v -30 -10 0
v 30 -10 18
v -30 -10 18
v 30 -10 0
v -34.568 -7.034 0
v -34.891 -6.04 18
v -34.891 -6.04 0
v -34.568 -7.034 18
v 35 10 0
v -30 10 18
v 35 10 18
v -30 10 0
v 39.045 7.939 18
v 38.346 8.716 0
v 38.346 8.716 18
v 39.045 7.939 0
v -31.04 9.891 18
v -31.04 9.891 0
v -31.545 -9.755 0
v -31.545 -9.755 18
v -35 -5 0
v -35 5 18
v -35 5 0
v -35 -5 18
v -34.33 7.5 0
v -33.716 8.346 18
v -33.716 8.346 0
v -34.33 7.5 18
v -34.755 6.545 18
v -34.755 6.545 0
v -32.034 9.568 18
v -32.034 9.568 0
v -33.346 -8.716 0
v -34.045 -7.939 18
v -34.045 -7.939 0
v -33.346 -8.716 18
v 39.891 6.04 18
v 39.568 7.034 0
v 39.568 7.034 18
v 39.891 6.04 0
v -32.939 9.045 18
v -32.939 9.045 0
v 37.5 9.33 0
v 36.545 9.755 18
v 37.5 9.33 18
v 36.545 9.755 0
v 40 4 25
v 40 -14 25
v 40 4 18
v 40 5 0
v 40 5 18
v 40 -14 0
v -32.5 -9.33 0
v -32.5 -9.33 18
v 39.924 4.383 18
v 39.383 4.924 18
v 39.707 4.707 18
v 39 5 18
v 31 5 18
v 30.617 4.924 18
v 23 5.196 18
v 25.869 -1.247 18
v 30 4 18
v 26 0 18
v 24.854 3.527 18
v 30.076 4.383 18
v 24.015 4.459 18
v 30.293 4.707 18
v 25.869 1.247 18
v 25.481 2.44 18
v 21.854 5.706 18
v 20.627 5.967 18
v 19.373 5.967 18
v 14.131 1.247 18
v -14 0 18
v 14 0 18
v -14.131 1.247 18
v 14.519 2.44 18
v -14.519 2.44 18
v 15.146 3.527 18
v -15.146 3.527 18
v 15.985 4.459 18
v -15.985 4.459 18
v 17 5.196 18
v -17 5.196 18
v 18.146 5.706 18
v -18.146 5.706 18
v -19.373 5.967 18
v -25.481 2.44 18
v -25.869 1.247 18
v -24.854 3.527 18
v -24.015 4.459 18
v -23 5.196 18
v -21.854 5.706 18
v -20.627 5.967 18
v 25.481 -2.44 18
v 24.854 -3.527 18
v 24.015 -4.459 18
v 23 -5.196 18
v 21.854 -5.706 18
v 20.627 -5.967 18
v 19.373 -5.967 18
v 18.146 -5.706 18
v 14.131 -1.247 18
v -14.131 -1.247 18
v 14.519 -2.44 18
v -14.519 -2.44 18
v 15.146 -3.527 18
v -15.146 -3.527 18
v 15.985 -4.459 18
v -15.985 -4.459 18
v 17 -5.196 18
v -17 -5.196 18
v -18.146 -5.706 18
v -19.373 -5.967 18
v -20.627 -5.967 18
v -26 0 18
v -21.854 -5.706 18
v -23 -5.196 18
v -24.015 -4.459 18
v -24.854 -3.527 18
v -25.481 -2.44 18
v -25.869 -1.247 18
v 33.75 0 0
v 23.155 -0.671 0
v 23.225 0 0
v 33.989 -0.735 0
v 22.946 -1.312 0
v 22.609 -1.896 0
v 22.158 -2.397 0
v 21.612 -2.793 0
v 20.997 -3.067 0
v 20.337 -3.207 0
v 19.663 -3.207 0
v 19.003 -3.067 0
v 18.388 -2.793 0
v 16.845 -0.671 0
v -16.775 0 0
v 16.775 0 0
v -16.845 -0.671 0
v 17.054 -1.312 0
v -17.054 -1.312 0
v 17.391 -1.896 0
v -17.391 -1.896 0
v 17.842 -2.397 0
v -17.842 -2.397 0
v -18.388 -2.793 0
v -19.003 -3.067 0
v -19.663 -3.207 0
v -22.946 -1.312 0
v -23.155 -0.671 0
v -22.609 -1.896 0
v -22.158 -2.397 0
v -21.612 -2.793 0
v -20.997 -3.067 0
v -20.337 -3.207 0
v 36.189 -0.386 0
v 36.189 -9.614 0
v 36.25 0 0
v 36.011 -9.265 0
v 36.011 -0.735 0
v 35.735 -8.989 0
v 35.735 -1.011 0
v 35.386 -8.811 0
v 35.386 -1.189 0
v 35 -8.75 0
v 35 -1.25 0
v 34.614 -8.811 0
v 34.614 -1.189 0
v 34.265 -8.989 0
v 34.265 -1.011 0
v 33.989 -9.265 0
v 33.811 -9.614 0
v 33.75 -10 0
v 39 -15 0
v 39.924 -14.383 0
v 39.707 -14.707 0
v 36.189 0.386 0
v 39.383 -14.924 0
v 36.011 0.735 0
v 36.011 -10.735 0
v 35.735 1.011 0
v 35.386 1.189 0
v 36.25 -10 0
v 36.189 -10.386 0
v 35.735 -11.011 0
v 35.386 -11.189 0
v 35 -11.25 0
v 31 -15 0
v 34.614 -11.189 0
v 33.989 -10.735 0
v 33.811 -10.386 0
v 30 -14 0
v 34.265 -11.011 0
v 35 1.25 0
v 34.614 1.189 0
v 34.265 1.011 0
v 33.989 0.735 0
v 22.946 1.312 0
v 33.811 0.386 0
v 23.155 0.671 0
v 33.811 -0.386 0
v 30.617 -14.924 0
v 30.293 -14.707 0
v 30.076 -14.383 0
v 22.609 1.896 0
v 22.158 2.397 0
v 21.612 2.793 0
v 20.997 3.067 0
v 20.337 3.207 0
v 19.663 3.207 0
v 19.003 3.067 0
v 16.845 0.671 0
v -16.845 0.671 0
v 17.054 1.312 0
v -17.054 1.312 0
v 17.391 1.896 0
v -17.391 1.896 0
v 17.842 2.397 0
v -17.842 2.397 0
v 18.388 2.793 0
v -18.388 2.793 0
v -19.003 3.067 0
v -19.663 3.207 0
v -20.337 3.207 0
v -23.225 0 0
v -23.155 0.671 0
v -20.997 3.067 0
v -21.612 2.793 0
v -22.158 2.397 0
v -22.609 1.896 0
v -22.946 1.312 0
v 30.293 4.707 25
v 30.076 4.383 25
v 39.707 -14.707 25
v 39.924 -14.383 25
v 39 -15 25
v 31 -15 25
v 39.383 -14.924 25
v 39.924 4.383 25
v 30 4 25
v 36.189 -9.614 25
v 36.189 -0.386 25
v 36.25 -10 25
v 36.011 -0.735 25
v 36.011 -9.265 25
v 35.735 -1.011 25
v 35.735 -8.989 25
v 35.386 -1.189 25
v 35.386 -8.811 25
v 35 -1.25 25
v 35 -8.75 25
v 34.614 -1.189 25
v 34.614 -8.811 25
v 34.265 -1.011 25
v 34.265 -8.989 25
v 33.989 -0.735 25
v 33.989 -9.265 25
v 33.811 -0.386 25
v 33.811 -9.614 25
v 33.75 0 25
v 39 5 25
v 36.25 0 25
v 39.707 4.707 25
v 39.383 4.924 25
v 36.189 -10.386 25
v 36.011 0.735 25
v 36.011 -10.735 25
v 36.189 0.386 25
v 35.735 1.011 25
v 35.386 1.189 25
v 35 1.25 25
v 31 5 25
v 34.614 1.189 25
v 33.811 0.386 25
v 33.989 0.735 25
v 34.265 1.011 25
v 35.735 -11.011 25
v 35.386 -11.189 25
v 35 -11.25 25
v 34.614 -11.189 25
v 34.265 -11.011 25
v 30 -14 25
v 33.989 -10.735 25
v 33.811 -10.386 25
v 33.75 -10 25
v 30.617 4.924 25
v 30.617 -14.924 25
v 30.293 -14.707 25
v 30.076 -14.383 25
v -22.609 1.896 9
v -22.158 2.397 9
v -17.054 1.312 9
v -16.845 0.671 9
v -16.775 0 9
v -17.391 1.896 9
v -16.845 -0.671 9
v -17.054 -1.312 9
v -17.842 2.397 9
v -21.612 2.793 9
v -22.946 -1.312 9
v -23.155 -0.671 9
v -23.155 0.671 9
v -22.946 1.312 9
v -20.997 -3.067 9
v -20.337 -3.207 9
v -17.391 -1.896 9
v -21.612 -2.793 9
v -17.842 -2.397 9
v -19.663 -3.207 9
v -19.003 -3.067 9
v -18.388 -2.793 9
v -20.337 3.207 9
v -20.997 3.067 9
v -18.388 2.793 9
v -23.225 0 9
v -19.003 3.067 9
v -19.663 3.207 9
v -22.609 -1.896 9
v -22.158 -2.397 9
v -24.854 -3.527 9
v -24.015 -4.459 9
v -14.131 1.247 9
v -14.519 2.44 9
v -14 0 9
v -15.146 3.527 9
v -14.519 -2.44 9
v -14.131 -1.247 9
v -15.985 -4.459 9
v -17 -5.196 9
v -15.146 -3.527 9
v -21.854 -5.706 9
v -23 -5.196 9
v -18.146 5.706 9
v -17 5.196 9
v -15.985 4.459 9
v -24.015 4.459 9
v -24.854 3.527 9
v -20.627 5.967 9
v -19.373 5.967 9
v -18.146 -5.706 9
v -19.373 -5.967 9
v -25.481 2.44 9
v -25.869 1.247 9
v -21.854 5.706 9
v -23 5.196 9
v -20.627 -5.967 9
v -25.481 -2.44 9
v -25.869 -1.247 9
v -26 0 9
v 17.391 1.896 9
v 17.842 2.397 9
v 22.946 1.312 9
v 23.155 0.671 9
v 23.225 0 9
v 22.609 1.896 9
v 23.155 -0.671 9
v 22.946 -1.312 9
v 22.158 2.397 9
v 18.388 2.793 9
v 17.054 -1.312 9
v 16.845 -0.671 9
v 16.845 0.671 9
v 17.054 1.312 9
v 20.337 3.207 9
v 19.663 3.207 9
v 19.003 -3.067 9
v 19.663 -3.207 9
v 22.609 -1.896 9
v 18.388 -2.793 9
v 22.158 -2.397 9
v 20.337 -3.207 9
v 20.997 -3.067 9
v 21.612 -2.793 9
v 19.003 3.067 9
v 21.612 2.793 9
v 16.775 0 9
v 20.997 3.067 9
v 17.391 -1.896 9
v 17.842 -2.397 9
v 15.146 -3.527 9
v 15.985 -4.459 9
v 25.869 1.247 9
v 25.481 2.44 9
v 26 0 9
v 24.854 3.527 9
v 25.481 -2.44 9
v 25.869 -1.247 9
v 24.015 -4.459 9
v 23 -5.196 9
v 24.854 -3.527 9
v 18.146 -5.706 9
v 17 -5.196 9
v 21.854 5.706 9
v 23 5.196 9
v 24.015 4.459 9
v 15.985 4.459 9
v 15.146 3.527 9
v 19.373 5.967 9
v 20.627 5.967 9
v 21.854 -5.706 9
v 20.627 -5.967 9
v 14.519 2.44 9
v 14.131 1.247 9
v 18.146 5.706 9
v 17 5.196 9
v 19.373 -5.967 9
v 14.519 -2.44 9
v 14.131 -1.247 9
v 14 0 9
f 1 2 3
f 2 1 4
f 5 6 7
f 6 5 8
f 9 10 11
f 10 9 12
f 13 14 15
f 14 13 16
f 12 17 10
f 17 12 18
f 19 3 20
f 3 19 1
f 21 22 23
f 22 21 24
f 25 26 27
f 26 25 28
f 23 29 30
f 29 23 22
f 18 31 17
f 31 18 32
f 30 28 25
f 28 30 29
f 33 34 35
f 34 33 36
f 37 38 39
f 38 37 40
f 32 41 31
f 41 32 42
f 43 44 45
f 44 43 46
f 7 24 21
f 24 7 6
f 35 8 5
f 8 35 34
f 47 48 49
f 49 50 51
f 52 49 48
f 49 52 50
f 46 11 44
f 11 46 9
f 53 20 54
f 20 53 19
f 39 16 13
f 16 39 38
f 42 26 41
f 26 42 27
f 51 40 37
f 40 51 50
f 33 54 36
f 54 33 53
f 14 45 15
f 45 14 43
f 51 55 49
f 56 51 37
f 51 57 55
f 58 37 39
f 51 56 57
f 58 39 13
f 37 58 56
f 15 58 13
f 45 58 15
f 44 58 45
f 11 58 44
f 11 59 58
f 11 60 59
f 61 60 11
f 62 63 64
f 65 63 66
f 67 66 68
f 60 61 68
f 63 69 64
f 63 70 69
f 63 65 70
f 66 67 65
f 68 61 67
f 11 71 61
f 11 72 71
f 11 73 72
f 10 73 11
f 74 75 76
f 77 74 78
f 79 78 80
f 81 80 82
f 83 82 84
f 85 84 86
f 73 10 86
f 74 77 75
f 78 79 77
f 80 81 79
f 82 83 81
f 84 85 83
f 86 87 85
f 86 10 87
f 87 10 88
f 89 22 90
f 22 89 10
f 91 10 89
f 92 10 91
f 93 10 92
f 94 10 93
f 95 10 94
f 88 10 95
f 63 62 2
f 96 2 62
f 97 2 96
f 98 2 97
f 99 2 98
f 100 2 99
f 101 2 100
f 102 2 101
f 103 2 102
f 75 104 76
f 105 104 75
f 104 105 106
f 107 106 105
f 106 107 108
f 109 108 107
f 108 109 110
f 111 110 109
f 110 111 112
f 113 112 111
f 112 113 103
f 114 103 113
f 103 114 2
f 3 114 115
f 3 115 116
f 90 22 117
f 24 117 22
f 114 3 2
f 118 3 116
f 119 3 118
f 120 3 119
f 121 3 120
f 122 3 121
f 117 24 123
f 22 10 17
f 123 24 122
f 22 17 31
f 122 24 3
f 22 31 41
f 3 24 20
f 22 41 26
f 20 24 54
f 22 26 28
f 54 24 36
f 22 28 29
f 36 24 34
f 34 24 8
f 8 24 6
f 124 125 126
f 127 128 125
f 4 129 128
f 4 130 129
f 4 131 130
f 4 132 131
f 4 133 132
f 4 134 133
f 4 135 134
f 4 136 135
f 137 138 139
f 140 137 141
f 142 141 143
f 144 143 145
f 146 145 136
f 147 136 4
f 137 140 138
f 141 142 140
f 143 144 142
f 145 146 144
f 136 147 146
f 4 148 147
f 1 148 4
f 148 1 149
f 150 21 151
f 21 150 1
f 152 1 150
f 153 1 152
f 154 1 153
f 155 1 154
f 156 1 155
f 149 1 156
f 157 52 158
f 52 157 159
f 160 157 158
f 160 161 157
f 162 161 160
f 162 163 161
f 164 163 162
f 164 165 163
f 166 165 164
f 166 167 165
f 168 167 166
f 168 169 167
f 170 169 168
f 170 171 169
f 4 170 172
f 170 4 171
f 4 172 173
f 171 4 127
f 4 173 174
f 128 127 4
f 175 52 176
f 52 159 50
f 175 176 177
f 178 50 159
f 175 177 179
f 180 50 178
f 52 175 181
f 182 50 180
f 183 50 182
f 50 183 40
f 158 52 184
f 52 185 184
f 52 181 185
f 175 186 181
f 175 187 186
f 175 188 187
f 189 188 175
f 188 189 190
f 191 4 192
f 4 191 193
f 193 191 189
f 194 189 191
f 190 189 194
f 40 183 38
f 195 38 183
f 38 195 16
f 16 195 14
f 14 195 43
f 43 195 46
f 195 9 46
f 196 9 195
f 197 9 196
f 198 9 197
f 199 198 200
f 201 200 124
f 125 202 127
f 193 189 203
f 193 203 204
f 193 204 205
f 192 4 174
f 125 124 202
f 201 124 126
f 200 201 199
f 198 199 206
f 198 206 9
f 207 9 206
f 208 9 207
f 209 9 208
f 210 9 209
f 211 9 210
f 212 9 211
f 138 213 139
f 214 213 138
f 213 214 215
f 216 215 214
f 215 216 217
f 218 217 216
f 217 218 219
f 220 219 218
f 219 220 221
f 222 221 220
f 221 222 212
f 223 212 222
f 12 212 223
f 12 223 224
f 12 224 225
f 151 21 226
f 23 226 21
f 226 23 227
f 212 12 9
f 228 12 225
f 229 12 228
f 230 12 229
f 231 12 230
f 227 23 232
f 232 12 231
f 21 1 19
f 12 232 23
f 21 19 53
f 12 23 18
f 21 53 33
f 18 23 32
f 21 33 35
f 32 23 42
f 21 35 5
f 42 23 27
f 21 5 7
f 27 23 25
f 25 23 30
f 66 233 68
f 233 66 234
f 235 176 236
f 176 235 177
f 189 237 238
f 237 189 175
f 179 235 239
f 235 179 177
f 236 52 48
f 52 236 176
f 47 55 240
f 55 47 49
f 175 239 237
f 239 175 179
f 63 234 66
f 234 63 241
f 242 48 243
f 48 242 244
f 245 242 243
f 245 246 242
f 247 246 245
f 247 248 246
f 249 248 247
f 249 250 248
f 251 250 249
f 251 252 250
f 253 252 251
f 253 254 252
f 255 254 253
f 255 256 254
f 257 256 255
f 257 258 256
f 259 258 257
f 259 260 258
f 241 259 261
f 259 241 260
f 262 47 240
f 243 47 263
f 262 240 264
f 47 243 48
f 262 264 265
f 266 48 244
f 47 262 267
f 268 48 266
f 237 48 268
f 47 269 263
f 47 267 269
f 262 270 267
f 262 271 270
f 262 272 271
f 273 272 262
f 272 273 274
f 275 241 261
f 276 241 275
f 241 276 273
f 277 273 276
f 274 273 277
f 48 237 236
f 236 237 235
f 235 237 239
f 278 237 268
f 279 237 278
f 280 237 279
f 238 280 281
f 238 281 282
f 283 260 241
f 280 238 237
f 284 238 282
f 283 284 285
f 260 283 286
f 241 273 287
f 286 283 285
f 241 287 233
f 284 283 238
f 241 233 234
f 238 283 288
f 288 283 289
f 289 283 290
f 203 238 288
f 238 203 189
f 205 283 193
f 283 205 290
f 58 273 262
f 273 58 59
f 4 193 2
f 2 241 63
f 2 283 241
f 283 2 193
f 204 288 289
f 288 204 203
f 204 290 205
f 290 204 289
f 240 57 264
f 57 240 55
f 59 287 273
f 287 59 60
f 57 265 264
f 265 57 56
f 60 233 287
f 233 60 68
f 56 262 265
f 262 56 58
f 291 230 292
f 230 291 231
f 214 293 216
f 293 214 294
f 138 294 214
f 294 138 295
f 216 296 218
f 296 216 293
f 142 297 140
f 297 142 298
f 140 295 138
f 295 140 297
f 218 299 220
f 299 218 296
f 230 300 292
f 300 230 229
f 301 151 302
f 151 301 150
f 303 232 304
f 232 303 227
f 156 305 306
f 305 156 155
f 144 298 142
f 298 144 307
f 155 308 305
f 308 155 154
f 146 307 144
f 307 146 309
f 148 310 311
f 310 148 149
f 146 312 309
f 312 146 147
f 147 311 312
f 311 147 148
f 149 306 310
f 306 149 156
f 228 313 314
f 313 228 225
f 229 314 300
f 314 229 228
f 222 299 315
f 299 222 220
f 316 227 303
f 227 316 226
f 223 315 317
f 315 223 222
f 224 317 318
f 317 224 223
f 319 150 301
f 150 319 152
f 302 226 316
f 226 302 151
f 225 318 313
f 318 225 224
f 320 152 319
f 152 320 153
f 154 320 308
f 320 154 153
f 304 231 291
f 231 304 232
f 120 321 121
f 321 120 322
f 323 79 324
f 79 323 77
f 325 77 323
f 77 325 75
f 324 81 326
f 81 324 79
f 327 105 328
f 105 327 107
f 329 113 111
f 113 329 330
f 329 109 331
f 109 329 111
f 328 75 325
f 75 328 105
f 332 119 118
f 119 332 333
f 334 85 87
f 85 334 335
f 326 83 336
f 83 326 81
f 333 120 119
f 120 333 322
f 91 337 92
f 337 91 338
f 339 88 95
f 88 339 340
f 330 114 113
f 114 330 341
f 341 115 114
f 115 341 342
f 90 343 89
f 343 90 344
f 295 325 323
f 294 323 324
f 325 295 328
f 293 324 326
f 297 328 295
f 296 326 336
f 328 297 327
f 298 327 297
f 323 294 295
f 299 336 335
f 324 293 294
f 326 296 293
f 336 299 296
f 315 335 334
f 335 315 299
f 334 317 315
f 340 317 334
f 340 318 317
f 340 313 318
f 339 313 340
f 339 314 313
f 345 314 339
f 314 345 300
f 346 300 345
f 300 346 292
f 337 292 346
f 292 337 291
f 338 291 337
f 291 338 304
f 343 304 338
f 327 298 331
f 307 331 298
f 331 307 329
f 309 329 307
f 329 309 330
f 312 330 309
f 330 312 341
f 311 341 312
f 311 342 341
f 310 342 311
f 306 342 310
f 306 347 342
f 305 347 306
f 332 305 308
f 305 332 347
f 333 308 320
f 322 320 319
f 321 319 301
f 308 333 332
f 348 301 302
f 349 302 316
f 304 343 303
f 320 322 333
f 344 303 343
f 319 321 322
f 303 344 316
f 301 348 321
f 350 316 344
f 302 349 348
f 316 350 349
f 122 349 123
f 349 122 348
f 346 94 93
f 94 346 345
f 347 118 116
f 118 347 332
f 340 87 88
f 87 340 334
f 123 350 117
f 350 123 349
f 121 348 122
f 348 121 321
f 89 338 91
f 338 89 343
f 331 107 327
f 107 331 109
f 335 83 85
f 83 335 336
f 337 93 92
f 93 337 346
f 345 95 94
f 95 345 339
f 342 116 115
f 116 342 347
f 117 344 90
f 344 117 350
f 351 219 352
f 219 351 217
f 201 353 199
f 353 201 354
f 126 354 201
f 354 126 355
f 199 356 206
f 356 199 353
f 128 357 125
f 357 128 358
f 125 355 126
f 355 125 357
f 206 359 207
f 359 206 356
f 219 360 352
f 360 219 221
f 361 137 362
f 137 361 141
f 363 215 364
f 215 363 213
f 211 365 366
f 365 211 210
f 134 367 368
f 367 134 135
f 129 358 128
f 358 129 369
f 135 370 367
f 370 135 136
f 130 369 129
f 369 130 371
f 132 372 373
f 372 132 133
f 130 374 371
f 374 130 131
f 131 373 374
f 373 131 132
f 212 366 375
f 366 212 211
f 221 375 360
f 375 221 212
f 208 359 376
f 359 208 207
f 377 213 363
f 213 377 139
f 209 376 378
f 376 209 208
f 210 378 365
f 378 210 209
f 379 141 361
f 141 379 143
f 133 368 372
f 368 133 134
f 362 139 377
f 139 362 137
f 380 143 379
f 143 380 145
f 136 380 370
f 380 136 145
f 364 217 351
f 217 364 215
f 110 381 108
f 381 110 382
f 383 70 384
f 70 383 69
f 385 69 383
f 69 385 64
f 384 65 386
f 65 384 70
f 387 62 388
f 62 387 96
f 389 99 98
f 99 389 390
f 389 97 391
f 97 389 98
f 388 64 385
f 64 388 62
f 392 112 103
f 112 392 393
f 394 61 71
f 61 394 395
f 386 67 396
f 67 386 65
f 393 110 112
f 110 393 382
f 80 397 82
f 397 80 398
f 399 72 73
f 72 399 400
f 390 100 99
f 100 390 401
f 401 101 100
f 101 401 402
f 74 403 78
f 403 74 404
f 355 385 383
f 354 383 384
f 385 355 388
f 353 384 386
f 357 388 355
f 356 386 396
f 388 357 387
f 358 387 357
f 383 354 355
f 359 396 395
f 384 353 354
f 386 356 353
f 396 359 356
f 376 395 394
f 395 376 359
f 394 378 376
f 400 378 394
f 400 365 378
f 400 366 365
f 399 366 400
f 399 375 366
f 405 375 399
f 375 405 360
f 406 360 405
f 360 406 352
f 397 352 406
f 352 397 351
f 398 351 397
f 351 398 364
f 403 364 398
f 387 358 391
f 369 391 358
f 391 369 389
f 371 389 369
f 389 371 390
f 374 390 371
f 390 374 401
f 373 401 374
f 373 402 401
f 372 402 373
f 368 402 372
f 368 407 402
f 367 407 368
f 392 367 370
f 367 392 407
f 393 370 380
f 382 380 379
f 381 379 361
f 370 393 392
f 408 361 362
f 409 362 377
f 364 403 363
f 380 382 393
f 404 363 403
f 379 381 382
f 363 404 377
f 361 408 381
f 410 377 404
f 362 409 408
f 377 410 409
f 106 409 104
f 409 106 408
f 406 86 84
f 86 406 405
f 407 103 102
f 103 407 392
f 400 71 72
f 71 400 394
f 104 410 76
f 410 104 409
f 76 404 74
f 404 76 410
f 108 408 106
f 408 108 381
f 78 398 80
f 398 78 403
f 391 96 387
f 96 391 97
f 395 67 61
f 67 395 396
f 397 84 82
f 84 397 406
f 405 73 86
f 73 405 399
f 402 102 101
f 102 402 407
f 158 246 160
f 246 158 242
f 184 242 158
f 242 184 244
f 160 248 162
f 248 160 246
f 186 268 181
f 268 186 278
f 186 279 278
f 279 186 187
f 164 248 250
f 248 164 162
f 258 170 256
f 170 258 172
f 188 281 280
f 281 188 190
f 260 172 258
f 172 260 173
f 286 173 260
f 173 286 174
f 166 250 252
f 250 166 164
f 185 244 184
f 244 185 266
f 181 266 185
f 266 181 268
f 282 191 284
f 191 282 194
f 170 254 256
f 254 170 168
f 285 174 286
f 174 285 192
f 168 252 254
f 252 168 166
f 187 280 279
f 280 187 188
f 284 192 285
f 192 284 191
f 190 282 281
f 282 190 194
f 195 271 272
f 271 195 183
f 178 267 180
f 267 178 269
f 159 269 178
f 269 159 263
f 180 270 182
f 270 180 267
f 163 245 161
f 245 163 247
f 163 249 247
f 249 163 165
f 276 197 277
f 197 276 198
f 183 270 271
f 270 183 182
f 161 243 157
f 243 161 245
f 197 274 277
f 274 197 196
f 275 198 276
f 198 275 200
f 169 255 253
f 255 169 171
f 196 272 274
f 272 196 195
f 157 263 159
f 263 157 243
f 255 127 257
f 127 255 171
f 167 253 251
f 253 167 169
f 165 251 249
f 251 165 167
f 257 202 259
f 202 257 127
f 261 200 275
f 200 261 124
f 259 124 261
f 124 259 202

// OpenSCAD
$fs=0.4;

/*
 * This module makes it easy to mount these affordable and sturdy limit switches:
 *
 * Crouzet 831810C2.EL
 * https://www.digikey.com/product-detail/en/crouzet/831810C2.EL/966-1338-ND
 * 
 * At the right height and spacing for use with carriages/gantries conveyed on
 * SBR-30 linear rails and RM-2505 ball screws which are Available from many
 * suppliers, e.g:
 * https://www.amazon.com/dp/B07HM4JRZB
 *
 * These are then mounted on 40-series aluminum extrusion from 8020 Inc.
 * aluminum extrusion in 40-4080, 40-4012, 40-8080, or 40-8016.  I'm partial
 * to the 40-8080 extrusion as a good compromise point between ease of use
 * and sturdiness:
 *
 * https://8020.net/40-8080.html
 *
 * Obviously you could modify this basic design if you use linear rails of a
 * different size, or aluminum extrusion of a different size, or even different
 * limit switches.
 *
 * I generally print these with 40% infill, 5 perimeters, 5 solid top layers,
 * and 5 solid bottom layers using a layer height of 0.2mm with an 0.4mm
 * nozzle with Hatchbox PLA filament.  Generally I use a 200C first layer
 * temperature and 195C subsequent layer temperature.
 *
 * For PLA I found I had to scale this design by 2.5% to account for
 * shrinkage (to keep the center-to-center spacing of the two M6 holes
 * to a true 40mm so it fits well with the extrusion it gets mounted to).
 */
module limit_switch_mount_40_8080(plate_min=9, H=25, horiz=0)
{
    if (horiz) {
        x_offset=20;
        y_offset=2.5;

        difference() {
            translate([0,y_offset])union() {
                linear_extrude(height=plate_min*2) offset(r=5) difference() {
                    square([50,20],center=true);
                    translate([0,-10])offset(r=7.5)square([10,10],center=true);
                }
                translate([x_offset,10,0])linear_extrude(height=H) offset(r=1) square([18,8],center=true);
            }
            union() {
                for (x=[-20,20]) translate([x,0,0]) {
                    translate([0,0,-1])cylinder(r=3.2, h=H+2);
                    translate([0,0,plate_min])cylinder(r=6,h=H);
                }
                for (x=[-5,5]) translate([x + x_offset,9 + y_offset,-1]) cylinder(r=1.27, h=H+2);
            }
        }
    } else {
        x_offset=35;
        y_offset=-5;
        difference() {
            union() {
                translate([2.5,0])linear_extrude(height=plate_min * 2) offset(r=5) square([65,10], center=true);
                translate([x_offset,y_offset])linear_extrude(height=H) offset(r=1) square([8,18], center=true);
            }
            union() {
                for(x=[-20,20]) translate([x,0,0]) {
                    translate([0,0,-1])cylinder(r=3.225, h=H+2);
                    translate([0,0,plate_min])cylinder(r=6,h=H);
                }
                for(y=[-5,5]) translate([x_offset, y + y_offset, -1]) cylinder(r=1.25, h=H+2);
            }
        }
    }
}

limit_switch_mount_40_8080();
